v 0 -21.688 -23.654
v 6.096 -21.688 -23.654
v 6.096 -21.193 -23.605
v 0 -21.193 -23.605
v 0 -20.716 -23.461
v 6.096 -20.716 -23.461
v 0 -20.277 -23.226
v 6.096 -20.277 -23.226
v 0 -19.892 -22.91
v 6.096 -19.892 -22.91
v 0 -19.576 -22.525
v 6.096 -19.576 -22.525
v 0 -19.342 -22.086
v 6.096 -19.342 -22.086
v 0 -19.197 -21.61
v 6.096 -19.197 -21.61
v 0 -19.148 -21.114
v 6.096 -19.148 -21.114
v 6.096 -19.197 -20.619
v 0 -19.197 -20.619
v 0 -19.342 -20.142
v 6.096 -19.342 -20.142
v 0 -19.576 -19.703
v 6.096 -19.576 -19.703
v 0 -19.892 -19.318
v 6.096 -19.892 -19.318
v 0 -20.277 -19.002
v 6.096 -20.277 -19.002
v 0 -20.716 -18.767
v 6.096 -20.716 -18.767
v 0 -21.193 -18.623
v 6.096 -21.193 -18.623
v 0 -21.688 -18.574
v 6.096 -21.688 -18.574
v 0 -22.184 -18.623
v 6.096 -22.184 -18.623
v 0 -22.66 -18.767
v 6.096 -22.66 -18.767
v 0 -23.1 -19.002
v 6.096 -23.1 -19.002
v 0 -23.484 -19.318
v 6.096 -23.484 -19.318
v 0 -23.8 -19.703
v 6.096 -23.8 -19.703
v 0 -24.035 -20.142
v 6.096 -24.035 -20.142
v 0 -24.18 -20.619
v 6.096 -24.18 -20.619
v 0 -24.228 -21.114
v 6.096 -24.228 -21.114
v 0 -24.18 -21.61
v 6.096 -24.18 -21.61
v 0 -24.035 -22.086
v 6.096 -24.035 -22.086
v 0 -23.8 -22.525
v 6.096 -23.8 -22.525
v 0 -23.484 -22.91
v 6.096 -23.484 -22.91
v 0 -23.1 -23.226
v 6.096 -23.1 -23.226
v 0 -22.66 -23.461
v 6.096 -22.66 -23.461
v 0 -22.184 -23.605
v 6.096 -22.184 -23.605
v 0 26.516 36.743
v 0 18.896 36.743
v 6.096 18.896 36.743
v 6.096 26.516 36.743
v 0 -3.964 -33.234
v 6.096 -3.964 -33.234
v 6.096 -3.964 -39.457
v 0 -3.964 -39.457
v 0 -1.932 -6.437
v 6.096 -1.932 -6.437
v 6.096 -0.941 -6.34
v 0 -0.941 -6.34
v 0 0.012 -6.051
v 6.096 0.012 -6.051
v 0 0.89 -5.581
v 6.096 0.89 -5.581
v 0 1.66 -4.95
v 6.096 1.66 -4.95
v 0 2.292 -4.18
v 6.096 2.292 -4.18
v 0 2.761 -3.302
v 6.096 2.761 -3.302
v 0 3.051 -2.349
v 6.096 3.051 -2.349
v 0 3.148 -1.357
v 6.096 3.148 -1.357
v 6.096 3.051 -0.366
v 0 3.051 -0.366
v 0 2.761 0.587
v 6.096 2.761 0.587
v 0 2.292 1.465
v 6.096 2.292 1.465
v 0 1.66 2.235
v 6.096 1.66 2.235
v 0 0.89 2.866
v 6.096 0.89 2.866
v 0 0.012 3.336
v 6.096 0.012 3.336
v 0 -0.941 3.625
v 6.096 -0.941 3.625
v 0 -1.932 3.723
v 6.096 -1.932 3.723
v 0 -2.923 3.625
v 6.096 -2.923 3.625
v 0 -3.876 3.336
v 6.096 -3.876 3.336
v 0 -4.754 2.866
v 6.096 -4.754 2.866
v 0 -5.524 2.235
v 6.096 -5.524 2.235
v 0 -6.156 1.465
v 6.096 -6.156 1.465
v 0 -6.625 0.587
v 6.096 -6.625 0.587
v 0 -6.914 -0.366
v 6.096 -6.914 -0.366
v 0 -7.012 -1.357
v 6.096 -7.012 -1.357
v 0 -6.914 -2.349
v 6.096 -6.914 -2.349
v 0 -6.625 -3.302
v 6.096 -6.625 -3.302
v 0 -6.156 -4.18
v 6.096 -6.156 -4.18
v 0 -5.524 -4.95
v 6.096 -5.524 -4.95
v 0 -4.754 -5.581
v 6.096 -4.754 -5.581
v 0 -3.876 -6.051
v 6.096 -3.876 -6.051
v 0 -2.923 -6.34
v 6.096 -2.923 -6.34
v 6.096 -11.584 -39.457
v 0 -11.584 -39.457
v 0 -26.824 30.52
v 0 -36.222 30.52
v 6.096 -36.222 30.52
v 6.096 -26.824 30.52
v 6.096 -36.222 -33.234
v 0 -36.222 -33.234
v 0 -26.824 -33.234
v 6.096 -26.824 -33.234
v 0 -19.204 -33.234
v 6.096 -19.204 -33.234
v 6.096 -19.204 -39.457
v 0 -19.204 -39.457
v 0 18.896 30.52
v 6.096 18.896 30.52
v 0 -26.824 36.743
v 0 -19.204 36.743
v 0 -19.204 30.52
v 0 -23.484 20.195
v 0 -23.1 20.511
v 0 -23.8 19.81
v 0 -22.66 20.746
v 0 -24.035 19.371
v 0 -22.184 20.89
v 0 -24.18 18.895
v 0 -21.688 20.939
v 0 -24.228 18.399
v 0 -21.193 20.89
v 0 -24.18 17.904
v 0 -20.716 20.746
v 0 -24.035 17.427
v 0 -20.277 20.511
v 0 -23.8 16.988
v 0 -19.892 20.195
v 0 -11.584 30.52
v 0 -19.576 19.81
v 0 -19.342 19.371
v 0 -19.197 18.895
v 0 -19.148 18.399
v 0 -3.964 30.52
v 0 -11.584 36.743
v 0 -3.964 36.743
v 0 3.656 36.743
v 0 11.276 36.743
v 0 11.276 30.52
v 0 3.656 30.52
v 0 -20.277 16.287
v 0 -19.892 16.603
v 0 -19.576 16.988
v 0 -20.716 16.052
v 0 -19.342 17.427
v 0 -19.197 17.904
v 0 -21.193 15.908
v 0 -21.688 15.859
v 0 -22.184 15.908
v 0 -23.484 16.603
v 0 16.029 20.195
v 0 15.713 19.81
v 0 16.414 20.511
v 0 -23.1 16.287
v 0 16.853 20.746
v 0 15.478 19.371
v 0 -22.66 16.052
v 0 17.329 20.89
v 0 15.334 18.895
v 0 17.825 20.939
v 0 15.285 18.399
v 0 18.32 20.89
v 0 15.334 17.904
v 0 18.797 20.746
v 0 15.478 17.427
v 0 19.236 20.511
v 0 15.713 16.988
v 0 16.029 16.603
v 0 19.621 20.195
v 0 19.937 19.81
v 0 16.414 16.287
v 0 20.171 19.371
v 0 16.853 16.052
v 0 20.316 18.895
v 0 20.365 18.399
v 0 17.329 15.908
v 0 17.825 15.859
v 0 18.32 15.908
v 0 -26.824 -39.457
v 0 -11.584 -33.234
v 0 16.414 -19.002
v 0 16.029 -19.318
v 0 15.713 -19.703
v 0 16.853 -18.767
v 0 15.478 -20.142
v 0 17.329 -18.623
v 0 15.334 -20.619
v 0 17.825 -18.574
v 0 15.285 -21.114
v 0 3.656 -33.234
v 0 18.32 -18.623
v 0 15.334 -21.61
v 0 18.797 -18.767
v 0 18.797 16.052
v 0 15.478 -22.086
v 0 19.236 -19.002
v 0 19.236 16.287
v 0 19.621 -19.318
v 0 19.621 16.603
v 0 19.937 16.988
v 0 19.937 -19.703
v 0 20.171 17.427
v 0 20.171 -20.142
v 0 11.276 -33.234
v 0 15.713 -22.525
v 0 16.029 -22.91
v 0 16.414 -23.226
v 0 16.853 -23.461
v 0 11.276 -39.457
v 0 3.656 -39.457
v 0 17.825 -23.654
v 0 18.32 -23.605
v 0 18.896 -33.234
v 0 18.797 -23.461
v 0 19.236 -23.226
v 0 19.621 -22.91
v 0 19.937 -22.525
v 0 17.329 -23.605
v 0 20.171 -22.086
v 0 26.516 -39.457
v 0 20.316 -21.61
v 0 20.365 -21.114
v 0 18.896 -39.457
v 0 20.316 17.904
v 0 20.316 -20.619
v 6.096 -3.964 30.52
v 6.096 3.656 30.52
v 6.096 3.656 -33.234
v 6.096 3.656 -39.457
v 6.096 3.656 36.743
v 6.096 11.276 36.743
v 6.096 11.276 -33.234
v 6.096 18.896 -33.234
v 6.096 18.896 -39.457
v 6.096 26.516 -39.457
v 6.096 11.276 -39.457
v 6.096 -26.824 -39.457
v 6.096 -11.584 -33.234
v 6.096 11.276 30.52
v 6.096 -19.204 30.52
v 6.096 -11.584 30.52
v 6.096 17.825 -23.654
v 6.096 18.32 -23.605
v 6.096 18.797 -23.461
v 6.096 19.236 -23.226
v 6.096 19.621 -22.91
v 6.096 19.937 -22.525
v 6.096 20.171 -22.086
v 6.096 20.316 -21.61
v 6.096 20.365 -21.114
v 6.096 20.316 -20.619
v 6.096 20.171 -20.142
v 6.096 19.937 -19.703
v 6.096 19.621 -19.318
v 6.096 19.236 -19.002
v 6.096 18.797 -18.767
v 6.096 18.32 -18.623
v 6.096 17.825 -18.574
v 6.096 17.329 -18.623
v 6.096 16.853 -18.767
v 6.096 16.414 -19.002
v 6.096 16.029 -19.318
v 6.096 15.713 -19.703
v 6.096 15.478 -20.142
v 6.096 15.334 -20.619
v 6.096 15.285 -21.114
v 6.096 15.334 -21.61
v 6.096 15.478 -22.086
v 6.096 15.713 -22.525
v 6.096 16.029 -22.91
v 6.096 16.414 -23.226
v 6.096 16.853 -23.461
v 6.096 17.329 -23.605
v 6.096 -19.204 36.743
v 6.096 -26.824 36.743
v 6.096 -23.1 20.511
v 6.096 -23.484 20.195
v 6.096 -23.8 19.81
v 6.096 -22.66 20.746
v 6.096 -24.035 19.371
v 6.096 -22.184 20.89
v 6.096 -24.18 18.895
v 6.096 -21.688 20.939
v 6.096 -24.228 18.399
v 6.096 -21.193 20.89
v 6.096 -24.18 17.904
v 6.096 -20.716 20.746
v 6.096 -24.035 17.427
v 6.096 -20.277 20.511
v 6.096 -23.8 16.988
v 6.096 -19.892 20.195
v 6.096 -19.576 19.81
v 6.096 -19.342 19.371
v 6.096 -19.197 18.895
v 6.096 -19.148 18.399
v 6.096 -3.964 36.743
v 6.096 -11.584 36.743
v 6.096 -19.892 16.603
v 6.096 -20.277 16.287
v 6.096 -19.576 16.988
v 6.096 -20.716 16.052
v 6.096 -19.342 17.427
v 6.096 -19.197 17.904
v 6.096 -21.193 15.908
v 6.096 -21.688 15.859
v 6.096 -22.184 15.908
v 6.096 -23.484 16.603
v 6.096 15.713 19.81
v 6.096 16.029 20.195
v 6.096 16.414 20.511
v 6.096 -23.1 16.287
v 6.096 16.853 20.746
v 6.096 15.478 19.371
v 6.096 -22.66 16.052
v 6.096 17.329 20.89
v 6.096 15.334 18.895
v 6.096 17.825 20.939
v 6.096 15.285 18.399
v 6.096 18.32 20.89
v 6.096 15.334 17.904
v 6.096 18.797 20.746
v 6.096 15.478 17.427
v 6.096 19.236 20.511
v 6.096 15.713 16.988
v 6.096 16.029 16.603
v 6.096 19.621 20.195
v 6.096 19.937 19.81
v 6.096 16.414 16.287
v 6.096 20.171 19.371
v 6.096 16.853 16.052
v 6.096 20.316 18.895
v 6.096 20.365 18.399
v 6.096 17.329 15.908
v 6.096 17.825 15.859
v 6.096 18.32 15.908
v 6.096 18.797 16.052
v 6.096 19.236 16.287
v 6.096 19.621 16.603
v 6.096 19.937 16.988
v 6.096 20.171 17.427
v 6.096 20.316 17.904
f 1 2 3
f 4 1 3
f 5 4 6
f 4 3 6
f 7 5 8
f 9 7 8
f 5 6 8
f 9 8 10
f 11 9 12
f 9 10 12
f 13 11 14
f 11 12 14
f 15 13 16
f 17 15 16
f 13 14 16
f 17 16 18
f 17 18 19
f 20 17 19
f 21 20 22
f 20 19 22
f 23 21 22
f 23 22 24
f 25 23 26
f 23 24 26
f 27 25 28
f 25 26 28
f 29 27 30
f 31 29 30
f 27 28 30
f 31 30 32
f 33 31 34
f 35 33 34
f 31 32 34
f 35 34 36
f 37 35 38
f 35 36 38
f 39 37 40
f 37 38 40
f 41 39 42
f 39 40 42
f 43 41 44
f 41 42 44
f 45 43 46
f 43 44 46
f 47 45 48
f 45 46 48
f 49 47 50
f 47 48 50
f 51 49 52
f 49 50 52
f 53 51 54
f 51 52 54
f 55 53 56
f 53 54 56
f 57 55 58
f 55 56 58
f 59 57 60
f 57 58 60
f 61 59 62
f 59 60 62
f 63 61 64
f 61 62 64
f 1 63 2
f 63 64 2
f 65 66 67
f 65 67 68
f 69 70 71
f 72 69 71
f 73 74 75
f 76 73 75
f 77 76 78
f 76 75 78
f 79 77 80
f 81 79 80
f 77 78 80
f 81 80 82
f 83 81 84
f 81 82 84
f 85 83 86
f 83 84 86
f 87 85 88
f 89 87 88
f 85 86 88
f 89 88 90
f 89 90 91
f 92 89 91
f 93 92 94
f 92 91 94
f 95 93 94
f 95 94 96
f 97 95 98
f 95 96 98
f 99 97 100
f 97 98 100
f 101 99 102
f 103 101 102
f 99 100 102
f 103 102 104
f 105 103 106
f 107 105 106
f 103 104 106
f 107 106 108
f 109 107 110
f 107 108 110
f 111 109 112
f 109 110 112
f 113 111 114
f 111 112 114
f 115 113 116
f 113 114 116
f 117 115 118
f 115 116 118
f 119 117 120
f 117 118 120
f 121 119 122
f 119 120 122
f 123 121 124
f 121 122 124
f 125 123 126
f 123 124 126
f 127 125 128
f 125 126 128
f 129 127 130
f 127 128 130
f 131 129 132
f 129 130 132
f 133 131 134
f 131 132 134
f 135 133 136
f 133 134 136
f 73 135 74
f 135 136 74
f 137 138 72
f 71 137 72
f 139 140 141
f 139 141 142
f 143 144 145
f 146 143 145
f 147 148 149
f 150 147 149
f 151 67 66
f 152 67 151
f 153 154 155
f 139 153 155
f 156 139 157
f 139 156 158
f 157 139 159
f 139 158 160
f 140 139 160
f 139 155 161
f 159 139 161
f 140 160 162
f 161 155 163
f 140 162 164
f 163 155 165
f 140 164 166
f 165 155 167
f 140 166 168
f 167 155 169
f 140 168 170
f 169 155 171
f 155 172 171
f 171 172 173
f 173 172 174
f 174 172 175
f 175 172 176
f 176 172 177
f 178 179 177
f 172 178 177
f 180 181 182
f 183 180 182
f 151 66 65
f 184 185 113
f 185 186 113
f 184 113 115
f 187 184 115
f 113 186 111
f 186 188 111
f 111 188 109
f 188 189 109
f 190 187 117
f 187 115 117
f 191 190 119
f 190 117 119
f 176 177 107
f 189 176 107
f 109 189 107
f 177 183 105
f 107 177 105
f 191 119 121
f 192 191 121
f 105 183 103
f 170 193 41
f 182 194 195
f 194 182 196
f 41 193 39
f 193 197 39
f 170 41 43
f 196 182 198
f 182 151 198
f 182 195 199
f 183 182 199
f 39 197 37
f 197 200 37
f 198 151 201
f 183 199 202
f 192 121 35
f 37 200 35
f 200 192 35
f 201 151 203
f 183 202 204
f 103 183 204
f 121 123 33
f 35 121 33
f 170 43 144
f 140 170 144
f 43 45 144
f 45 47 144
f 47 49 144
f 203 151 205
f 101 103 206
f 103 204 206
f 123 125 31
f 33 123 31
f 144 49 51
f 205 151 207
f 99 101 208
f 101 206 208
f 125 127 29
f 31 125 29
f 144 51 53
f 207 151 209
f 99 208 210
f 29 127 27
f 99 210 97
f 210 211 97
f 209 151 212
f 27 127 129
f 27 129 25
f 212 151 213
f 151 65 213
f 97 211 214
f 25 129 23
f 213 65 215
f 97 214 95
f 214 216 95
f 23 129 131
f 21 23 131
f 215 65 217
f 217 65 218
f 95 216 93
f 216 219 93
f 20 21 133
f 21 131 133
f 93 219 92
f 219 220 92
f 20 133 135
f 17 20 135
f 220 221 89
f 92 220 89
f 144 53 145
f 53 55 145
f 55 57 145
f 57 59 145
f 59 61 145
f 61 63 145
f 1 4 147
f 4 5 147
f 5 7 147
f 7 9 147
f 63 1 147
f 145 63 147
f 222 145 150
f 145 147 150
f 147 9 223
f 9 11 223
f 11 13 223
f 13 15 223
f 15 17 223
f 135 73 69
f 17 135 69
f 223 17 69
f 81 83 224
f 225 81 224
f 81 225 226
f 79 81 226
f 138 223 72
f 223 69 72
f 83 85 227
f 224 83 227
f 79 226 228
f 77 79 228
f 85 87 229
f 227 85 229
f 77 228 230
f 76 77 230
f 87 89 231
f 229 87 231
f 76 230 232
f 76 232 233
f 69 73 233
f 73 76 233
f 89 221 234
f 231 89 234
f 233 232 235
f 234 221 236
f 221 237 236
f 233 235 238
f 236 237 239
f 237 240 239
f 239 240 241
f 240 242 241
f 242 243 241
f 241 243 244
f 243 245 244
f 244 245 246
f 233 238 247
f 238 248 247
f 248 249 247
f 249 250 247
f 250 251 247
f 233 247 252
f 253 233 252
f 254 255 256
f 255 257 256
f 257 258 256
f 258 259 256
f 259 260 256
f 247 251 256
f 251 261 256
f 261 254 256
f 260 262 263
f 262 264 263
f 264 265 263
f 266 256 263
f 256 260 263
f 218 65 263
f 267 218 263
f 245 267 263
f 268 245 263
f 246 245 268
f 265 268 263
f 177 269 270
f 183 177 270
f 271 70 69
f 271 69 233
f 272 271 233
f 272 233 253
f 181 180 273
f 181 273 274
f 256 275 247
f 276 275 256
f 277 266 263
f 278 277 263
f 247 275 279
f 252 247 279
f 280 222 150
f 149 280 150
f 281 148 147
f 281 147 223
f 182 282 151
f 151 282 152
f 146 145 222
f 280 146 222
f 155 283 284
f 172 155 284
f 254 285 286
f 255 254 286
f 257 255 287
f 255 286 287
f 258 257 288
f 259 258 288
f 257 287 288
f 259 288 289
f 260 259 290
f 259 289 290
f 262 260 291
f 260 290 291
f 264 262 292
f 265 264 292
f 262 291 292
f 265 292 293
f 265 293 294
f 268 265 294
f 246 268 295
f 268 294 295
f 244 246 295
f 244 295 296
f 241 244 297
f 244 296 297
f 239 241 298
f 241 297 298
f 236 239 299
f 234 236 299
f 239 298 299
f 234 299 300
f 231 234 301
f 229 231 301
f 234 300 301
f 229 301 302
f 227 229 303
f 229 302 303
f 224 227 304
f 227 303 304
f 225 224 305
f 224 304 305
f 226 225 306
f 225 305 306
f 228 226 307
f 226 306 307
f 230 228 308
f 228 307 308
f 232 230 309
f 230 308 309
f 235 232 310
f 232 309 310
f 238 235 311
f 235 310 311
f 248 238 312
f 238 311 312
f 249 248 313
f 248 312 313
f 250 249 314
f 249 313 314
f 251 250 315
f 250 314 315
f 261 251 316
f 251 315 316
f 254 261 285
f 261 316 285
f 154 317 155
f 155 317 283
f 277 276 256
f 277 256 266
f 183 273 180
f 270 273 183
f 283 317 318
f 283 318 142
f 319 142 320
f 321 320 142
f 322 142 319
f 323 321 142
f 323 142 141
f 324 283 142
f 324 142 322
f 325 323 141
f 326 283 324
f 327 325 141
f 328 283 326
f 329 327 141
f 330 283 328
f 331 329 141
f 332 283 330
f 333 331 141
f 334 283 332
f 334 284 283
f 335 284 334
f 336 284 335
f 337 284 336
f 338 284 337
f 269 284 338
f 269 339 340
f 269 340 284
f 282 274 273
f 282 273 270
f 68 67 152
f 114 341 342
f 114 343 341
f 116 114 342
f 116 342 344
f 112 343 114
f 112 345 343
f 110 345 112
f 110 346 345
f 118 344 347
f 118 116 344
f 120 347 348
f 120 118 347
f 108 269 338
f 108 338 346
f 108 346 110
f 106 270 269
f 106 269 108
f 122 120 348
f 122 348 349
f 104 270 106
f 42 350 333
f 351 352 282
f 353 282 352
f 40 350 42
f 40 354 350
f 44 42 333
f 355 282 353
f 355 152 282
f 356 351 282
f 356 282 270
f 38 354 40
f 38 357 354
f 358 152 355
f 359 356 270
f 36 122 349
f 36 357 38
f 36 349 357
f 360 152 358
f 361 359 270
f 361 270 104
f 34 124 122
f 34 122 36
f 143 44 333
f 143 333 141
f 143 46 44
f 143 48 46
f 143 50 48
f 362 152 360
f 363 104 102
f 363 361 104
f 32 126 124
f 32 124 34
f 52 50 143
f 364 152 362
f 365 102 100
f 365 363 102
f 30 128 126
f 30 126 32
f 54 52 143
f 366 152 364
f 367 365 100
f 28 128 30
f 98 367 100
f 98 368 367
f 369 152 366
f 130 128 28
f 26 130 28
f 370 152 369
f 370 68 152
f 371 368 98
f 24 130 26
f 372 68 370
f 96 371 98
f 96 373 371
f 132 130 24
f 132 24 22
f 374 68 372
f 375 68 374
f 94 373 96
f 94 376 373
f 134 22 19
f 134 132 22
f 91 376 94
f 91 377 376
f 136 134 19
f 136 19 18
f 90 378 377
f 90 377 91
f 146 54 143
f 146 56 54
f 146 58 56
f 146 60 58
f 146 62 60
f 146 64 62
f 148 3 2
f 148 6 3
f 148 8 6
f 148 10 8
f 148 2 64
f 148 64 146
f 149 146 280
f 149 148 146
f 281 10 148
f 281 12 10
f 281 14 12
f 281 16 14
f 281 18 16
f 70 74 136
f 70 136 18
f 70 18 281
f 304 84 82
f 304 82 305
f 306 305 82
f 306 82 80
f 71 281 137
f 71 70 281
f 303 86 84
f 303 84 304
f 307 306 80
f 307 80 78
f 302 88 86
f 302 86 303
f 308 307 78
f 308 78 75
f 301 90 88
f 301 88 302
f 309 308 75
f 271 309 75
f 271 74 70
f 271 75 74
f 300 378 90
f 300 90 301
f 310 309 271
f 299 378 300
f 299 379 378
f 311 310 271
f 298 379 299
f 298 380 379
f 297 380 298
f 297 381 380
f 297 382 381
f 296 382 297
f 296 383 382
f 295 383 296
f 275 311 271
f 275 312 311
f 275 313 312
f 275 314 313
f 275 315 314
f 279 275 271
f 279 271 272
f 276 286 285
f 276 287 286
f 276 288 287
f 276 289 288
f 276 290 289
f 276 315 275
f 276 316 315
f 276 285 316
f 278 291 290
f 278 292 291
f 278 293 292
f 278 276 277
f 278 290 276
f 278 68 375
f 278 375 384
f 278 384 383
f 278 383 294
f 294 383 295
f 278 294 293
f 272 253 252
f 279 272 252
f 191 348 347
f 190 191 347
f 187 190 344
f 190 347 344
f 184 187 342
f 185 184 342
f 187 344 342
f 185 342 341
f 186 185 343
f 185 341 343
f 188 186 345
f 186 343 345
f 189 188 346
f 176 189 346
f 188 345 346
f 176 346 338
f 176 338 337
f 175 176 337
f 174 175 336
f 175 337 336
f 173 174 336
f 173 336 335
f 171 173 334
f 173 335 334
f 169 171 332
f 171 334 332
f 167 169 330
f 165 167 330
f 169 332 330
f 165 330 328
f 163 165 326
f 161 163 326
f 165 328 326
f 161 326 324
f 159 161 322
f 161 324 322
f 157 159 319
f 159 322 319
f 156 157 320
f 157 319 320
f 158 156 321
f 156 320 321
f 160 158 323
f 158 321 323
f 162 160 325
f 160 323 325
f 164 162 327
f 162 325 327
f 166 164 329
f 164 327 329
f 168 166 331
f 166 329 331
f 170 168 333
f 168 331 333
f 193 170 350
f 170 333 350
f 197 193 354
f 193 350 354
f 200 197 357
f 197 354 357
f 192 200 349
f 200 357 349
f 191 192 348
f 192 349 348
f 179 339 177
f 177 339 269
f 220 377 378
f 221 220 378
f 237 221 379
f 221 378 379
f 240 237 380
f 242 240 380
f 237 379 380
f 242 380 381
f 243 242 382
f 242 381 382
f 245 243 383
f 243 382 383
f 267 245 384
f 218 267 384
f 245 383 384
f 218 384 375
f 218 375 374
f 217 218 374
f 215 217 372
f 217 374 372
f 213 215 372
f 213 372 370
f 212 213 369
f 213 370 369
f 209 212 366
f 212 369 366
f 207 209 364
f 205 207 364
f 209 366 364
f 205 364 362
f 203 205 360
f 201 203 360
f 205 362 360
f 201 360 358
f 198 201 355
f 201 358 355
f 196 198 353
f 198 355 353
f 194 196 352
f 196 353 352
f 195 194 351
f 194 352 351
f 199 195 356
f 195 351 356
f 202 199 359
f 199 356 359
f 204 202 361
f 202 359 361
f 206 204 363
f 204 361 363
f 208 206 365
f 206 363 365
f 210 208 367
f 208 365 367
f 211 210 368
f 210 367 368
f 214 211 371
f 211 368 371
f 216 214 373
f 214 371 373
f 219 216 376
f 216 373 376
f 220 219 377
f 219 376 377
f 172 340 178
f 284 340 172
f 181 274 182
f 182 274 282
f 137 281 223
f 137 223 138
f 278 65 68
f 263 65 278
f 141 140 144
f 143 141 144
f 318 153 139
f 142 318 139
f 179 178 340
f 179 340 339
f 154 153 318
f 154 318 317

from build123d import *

# Parameters (mm, degrees)
SKETCH1_W               = 76.2
SKETCH1_H               = 62.738
BOSS_EXTRUDE1_DEPTH     = 6.096
SKETCH2_R               = 5.08
SKETCH2_R_2             = 2.54
CUT_EXTRUDE1_DEPTH      = 6.096
SKETCH3_W               = 6.223
SKETCH3_H               = 7.62
CUT_EXTRUDE2_DEPTH      = 6.096
CUT_EXTRUDE3_DEPTH      = 7.874
CUT_EXTRUDE3_DEPTH_BACK = 6.096
SKETCH4_W               = 6.223
SKETCH4_H               = 9.398


with BuildPart() as part:
    # Sketch1 → Boss-Extrude1 (new body)
    with BuildSketch(Plane(origin=(0, 0, 0), x_dir=(0, 0, -1), z_dir=(1, 0, 0))):
        with Locations((1.357482185, -4.852847981)):
            Rectangle(SKETCH1_W, SKETCH1_H)
    extrude(amount=BOSS_EXTRUDE1_DEPTH)

    # Sketch2 → Cut-Extrude1 (cut)
    with BuildSketch(Plane(origin=(6.096, 0, 0), x_dir=(0, 0, -1), z_dir=(1, 0, 0))):
        with Locations((1.357482185, -1.931847981)):
            Circle(SKETCH2_R)
        with Locations((-18.399081281, 17.824715485)):
            Circle(SKETCH2_R_2)
        with Locations((21.114045652, 17.824715485)):
            Circle(SKETCH2_R_2)
        with Locations((21.114045652, -21.688411447)):
            Circle(SKETCH2_R_2)
        with Locations((-18.399081281, -21.688411447)):
            Circle(SKETCH2_R_2)
    extrude(amount=-CUT_EXTRUDE1_DEPTH, mode=Mode.SUBTRACT)

    # Sketch3 → Cut-Extrude2 (cut)
    with BuildSketch(Plane(origin=(6.096, 0, 0), x_dir=(0, 0, -1), z_dir=(1, 0, 0))):
        with Locations((-33.631017815, 15.086152019)):
            Rectangle(SKETCH3_W, SKETCH3_H)
        with Locations((-33.631017815, -0.153847981)):
            Rectangle(SKETCH3_W, SKETCH3_H)
        with Locations((-33.631017815, -15.393847981)):
            Rectangle(SKETCH3_W, SKETCH3_H)
        with Locations((36.345982185, -15.393847981)):
            Rectangle(SKETCH3_W, SKETCH3_H)
        with Locations((36.345982185, 15.086152019)):
            Rectangle(SKETCH3_W, SKETCH3_H)
        with Locations((36.345982185, -0.153847981)):
            Rectangle(SKETCH3_W, SKETCH3_H)
    extrude(amount=-CUT_EXTRUDE2_DEPTH, mode=Mode.SUBTRACT)

    # Sketch4 → Cut-Extrude3 (cut, two sides: drawn at the far end of the back side and taken through both)
    with BuildSketch(Plane(origin=(6.096, 0, 0), x_dir=(0, 0, -1), z_dir=(1, 0, 0)).offset(-CUT_EXTRUDE3_DEPTH_BACK)):
        with Locations((36.345982185, -31.522847981)):
            Rectangle(SKETCH4_W, SKETCH4_H)
        with Locations((-33.631017815, -31.522847981)):
            Rectangle(SKETCH4_W, SKETCH4_H)
    extrude(amount=CUT_EXTRUDE3_DEPTH + CUT_EXTRUDE3_DEPTH_BACK, mode=Mode.SUBTRACT)


solid = part.part
